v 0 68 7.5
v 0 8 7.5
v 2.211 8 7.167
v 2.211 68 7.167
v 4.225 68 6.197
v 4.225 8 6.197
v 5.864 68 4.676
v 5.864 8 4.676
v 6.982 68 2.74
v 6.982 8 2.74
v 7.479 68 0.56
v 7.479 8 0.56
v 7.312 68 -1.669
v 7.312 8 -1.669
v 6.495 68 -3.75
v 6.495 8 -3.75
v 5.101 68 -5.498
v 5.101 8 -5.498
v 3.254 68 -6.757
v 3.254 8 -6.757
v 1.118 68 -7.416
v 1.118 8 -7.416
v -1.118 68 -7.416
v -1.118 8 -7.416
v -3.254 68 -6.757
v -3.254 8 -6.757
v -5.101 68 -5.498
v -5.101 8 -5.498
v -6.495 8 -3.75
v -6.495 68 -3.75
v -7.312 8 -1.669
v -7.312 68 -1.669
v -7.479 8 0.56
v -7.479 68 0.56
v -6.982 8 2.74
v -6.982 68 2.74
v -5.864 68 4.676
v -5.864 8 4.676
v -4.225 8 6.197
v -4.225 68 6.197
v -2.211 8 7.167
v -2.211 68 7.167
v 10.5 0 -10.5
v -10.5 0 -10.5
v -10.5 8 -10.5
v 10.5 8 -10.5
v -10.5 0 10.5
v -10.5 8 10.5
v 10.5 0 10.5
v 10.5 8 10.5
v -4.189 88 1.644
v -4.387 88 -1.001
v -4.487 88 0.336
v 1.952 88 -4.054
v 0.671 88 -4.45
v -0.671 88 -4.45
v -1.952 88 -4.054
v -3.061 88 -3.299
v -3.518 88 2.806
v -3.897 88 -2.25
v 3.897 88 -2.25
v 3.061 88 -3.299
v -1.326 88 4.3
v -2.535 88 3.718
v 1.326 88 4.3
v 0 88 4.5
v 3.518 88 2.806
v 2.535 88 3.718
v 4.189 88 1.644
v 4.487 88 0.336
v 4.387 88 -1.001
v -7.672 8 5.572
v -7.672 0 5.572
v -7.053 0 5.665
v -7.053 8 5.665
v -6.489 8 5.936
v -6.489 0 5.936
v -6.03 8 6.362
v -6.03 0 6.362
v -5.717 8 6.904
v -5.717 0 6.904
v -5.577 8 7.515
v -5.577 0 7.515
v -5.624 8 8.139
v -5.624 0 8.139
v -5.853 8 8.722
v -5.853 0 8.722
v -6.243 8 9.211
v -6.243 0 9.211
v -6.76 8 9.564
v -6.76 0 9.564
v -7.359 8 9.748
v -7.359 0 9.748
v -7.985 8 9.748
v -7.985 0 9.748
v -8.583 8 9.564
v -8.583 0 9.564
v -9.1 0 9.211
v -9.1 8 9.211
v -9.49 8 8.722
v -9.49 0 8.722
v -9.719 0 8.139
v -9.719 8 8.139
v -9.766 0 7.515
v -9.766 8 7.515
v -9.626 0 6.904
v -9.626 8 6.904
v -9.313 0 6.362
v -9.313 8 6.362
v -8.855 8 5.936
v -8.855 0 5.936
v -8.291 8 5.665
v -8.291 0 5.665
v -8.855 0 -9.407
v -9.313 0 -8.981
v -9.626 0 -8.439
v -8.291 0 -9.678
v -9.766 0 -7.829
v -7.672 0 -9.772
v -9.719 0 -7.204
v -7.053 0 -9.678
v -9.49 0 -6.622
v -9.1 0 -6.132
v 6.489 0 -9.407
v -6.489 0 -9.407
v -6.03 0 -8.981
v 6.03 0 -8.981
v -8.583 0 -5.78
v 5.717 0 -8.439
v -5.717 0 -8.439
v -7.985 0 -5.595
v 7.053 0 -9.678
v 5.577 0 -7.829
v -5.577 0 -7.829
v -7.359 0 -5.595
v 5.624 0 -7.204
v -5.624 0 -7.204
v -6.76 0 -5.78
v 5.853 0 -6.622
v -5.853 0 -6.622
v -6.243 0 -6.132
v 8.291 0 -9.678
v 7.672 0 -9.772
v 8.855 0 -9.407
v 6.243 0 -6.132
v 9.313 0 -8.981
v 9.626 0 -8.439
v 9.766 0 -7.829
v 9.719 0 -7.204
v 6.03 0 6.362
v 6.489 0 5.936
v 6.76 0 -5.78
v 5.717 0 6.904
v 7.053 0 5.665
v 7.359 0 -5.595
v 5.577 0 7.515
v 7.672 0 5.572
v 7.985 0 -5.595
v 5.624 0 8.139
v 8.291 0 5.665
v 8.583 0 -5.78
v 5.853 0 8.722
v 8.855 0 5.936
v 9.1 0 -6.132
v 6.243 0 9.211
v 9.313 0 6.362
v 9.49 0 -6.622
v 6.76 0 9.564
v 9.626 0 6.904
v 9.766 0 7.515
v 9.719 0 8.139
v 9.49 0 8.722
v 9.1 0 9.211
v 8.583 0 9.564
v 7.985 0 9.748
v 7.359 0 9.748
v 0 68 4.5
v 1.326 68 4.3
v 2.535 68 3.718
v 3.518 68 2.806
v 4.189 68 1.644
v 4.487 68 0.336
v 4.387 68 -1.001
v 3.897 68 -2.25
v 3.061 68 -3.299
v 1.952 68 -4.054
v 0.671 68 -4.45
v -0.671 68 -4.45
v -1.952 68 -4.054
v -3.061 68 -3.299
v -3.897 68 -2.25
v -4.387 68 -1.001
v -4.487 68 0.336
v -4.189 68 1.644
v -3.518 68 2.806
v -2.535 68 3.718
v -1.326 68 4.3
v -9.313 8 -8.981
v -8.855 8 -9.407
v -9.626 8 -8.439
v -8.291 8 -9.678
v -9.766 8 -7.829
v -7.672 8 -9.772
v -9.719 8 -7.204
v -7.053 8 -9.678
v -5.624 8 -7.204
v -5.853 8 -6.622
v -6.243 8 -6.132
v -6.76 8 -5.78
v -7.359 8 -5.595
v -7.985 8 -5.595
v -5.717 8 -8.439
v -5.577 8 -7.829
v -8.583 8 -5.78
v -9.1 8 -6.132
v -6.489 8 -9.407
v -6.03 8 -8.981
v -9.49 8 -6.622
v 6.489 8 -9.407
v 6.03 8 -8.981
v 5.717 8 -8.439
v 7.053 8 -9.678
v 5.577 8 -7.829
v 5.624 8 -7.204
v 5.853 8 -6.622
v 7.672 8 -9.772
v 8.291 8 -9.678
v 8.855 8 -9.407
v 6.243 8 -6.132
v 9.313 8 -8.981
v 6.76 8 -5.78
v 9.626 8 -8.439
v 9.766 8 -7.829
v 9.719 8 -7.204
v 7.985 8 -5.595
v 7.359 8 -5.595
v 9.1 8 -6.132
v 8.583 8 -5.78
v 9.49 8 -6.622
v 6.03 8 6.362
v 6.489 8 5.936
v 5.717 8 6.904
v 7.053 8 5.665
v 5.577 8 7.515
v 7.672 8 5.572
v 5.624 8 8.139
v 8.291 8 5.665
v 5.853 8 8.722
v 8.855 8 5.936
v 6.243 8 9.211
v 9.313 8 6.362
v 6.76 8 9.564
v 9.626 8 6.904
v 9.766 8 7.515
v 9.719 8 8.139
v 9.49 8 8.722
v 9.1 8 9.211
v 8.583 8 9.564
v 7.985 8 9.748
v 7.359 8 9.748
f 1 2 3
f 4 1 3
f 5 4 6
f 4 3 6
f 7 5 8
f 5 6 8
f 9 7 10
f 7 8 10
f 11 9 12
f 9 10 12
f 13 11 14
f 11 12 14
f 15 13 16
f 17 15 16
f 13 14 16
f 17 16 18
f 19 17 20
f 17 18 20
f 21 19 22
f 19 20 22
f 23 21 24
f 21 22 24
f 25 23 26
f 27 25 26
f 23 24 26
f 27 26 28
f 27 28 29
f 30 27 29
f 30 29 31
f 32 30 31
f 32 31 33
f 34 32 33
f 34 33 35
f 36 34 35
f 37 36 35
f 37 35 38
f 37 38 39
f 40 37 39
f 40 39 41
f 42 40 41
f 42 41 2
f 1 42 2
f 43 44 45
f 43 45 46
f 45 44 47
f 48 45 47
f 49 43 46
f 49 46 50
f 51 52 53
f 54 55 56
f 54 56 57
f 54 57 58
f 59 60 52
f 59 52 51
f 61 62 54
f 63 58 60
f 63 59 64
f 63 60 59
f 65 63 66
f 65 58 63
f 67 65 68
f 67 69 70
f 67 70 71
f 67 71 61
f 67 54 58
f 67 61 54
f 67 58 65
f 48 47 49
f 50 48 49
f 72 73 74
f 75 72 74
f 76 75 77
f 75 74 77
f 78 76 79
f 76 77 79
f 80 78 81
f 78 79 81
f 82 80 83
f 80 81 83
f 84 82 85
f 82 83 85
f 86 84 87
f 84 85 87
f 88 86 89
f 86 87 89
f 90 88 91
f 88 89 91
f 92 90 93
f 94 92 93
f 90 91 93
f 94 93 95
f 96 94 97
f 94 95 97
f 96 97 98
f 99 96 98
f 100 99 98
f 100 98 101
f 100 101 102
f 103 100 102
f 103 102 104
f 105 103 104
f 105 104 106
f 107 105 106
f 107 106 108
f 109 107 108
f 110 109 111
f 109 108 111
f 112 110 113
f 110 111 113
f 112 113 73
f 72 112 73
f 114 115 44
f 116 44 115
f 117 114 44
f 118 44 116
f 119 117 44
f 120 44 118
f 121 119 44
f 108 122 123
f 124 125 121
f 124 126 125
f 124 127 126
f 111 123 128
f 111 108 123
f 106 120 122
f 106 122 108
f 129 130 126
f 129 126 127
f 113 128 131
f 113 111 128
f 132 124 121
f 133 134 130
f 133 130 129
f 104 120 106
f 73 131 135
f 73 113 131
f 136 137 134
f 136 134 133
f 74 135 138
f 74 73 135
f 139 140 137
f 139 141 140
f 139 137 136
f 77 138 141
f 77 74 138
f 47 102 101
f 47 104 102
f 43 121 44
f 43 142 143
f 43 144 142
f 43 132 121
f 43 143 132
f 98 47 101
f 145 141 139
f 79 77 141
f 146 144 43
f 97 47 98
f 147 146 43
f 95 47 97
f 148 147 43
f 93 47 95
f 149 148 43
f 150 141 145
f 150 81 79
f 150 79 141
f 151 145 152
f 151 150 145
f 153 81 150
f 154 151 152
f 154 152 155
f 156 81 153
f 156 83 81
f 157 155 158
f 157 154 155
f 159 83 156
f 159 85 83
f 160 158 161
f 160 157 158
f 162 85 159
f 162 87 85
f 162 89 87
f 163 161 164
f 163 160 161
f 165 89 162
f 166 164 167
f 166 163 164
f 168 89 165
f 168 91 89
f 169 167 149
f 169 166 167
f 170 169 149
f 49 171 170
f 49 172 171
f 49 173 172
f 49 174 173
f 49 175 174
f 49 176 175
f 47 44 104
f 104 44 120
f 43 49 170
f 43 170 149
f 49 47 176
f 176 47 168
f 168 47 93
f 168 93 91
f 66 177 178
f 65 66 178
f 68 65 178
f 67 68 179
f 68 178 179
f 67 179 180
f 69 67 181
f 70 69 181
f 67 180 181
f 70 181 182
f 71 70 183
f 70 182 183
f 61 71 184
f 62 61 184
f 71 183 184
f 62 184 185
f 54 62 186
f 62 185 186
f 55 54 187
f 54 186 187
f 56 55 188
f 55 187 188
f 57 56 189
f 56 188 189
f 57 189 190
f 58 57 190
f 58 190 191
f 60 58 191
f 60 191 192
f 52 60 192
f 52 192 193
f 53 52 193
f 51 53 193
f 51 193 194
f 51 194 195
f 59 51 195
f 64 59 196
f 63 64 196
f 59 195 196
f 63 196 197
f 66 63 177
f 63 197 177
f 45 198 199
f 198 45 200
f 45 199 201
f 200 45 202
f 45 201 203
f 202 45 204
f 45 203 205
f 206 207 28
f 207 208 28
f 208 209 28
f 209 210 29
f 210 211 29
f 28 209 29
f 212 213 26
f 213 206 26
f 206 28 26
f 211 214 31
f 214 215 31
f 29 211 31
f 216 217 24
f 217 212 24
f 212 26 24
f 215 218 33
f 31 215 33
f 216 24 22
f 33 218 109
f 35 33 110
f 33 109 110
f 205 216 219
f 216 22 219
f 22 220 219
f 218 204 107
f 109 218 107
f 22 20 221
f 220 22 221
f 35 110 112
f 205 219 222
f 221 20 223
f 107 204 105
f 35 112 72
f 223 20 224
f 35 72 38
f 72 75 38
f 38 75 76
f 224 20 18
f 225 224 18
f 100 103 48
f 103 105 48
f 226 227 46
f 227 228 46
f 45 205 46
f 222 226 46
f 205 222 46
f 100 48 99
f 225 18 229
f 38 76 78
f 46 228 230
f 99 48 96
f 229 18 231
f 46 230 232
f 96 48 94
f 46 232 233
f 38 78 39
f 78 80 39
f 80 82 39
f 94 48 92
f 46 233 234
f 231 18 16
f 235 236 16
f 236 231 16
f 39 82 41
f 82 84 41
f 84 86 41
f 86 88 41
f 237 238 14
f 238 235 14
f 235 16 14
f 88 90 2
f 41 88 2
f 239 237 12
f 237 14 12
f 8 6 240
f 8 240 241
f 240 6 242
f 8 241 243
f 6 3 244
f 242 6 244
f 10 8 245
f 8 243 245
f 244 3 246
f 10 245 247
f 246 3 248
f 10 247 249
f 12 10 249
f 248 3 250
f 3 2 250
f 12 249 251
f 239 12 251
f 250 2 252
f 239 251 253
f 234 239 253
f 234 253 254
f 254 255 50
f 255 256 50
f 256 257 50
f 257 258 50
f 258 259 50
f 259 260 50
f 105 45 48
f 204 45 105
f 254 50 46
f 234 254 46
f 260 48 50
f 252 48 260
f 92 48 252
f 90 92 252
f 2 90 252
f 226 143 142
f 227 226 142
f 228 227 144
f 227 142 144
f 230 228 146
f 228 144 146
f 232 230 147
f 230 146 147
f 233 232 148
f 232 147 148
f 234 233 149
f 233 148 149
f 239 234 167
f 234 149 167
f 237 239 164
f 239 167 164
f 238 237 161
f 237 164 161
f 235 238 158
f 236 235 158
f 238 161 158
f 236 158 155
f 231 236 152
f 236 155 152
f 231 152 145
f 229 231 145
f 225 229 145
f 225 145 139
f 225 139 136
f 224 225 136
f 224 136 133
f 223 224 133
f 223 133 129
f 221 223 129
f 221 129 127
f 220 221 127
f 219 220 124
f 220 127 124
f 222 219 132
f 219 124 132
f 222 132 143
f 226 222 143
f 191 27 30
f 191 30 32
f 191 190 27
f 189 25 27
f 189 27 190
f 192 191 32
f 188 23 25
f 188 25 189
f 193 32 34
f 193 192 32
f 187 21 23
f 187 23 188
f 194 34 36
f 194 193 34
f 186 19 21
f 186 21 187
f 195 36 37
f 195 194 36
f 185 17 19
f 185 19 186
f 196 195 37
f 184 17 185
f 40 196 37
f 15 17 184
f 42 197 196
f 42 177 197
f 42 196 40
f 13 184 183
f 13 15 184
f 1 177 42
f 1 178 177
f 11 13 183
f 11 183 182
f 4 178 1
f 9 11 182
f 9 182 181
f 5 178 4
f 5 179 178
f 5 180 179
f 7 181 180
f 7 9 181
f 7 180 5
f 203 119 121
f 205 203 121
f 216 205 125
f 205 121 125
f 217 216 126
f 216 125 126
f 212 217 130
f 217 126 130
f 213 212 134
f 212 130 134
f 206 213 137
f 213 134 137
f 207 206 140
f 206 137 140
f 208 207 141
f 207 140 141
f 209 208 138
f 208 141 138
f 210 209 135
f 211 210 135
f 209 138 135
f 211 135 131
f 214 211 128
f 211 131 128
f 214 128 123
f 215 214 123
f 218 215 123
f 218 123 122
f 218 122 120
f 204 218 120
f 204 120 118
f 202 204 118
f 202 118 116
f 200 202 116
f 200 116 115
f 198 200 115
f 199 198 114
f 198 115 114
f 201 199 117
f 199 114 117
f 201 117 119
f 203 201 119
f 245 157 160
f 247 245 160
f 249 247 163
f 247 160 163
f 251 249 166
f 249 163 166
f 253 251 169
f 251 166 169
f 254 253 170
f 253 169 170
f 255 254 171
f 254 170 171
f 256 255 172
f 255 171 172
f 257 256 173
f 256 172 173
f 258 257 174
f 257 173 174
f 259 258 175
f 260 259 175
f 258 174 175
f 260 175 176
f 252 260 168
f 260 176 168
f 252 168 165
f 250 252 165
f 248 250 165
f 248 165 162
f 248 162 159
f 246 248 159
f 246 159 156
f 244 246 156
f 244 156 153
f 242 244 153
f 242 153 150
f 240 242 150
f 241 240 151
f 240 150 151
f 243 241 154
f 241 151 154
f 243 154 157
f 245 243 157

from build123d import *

# Parameters (mm, degrees)
SKETCH_1_R      = 7.5
EXTRUDE_1_DEPTH = 68
SKETCH_2_W      = 21
SKETCH_2_H      = 21
SKETCH_2_R      = 2.1
EXTRUDE_2_DEPTH = 8
SKETCH_3_R      = 4.5
EXTRUDE_3_DEPTH = 20


with BuildPart() as part:
    # 草图1 → 凸台-拉伸1 (new body)
    with BuildSketch(Plane(origin=(0, 0, 0), x_dir=(1, 0, 0), z_dir=(0, 1, 0))):
        with Locations(Location((0, 0, 0), (0, 0, 270))):
            Circle(SKETCH_1_R)
    extrude(amount=EXTRUDE_1_DEPTH)

    # 草图2 → 凸台-拉伸2 (add)
    with BuildSketch(Plane.XZ):
        Rectangle(SKETCH_2_W, SKETCH_2_H)
        with Locations(Location((-7.671572875, 7.671572875, 0), (0, 0, 270))):
            Circle(SKETCH_2_R, mode=Mode.SUBTRACT)
        with Locations(Location((7.671572875, -7.671572875, 0), (0, 0, 270))):
            Circle(SKETCH_2_R, mode=Mode.SUBTRACT)
        with Locations(Location((7.671572875, 7.671572875, 0), (0, 0, 270))):
            Circle(SKETCH_2_R, mode=Mode.SUBTRACT)
        with Locations(Location((-7.671572875, -7.671572875, 0), (0, 0, 270))):
            Circle(SKETCH_2_R, mode=Mode.SUBTRACT)
    extrude(amount=-EXTRUDE_2_DEPTH)

    # 草图3 → 凸台-拉伸3 (add)
    with BuildSketch(Plane(origin=(0, 68, 0), x_dir=(1, 0, 0), z_dir=(0, 1, 0))):
        with Locations(Location((0, 0, 0), (0, 0, 270))):
            Circle(SKETCH_3_R)
    extrude(amount=EXTRUDE_3_DEPTH)


solid = part.part
